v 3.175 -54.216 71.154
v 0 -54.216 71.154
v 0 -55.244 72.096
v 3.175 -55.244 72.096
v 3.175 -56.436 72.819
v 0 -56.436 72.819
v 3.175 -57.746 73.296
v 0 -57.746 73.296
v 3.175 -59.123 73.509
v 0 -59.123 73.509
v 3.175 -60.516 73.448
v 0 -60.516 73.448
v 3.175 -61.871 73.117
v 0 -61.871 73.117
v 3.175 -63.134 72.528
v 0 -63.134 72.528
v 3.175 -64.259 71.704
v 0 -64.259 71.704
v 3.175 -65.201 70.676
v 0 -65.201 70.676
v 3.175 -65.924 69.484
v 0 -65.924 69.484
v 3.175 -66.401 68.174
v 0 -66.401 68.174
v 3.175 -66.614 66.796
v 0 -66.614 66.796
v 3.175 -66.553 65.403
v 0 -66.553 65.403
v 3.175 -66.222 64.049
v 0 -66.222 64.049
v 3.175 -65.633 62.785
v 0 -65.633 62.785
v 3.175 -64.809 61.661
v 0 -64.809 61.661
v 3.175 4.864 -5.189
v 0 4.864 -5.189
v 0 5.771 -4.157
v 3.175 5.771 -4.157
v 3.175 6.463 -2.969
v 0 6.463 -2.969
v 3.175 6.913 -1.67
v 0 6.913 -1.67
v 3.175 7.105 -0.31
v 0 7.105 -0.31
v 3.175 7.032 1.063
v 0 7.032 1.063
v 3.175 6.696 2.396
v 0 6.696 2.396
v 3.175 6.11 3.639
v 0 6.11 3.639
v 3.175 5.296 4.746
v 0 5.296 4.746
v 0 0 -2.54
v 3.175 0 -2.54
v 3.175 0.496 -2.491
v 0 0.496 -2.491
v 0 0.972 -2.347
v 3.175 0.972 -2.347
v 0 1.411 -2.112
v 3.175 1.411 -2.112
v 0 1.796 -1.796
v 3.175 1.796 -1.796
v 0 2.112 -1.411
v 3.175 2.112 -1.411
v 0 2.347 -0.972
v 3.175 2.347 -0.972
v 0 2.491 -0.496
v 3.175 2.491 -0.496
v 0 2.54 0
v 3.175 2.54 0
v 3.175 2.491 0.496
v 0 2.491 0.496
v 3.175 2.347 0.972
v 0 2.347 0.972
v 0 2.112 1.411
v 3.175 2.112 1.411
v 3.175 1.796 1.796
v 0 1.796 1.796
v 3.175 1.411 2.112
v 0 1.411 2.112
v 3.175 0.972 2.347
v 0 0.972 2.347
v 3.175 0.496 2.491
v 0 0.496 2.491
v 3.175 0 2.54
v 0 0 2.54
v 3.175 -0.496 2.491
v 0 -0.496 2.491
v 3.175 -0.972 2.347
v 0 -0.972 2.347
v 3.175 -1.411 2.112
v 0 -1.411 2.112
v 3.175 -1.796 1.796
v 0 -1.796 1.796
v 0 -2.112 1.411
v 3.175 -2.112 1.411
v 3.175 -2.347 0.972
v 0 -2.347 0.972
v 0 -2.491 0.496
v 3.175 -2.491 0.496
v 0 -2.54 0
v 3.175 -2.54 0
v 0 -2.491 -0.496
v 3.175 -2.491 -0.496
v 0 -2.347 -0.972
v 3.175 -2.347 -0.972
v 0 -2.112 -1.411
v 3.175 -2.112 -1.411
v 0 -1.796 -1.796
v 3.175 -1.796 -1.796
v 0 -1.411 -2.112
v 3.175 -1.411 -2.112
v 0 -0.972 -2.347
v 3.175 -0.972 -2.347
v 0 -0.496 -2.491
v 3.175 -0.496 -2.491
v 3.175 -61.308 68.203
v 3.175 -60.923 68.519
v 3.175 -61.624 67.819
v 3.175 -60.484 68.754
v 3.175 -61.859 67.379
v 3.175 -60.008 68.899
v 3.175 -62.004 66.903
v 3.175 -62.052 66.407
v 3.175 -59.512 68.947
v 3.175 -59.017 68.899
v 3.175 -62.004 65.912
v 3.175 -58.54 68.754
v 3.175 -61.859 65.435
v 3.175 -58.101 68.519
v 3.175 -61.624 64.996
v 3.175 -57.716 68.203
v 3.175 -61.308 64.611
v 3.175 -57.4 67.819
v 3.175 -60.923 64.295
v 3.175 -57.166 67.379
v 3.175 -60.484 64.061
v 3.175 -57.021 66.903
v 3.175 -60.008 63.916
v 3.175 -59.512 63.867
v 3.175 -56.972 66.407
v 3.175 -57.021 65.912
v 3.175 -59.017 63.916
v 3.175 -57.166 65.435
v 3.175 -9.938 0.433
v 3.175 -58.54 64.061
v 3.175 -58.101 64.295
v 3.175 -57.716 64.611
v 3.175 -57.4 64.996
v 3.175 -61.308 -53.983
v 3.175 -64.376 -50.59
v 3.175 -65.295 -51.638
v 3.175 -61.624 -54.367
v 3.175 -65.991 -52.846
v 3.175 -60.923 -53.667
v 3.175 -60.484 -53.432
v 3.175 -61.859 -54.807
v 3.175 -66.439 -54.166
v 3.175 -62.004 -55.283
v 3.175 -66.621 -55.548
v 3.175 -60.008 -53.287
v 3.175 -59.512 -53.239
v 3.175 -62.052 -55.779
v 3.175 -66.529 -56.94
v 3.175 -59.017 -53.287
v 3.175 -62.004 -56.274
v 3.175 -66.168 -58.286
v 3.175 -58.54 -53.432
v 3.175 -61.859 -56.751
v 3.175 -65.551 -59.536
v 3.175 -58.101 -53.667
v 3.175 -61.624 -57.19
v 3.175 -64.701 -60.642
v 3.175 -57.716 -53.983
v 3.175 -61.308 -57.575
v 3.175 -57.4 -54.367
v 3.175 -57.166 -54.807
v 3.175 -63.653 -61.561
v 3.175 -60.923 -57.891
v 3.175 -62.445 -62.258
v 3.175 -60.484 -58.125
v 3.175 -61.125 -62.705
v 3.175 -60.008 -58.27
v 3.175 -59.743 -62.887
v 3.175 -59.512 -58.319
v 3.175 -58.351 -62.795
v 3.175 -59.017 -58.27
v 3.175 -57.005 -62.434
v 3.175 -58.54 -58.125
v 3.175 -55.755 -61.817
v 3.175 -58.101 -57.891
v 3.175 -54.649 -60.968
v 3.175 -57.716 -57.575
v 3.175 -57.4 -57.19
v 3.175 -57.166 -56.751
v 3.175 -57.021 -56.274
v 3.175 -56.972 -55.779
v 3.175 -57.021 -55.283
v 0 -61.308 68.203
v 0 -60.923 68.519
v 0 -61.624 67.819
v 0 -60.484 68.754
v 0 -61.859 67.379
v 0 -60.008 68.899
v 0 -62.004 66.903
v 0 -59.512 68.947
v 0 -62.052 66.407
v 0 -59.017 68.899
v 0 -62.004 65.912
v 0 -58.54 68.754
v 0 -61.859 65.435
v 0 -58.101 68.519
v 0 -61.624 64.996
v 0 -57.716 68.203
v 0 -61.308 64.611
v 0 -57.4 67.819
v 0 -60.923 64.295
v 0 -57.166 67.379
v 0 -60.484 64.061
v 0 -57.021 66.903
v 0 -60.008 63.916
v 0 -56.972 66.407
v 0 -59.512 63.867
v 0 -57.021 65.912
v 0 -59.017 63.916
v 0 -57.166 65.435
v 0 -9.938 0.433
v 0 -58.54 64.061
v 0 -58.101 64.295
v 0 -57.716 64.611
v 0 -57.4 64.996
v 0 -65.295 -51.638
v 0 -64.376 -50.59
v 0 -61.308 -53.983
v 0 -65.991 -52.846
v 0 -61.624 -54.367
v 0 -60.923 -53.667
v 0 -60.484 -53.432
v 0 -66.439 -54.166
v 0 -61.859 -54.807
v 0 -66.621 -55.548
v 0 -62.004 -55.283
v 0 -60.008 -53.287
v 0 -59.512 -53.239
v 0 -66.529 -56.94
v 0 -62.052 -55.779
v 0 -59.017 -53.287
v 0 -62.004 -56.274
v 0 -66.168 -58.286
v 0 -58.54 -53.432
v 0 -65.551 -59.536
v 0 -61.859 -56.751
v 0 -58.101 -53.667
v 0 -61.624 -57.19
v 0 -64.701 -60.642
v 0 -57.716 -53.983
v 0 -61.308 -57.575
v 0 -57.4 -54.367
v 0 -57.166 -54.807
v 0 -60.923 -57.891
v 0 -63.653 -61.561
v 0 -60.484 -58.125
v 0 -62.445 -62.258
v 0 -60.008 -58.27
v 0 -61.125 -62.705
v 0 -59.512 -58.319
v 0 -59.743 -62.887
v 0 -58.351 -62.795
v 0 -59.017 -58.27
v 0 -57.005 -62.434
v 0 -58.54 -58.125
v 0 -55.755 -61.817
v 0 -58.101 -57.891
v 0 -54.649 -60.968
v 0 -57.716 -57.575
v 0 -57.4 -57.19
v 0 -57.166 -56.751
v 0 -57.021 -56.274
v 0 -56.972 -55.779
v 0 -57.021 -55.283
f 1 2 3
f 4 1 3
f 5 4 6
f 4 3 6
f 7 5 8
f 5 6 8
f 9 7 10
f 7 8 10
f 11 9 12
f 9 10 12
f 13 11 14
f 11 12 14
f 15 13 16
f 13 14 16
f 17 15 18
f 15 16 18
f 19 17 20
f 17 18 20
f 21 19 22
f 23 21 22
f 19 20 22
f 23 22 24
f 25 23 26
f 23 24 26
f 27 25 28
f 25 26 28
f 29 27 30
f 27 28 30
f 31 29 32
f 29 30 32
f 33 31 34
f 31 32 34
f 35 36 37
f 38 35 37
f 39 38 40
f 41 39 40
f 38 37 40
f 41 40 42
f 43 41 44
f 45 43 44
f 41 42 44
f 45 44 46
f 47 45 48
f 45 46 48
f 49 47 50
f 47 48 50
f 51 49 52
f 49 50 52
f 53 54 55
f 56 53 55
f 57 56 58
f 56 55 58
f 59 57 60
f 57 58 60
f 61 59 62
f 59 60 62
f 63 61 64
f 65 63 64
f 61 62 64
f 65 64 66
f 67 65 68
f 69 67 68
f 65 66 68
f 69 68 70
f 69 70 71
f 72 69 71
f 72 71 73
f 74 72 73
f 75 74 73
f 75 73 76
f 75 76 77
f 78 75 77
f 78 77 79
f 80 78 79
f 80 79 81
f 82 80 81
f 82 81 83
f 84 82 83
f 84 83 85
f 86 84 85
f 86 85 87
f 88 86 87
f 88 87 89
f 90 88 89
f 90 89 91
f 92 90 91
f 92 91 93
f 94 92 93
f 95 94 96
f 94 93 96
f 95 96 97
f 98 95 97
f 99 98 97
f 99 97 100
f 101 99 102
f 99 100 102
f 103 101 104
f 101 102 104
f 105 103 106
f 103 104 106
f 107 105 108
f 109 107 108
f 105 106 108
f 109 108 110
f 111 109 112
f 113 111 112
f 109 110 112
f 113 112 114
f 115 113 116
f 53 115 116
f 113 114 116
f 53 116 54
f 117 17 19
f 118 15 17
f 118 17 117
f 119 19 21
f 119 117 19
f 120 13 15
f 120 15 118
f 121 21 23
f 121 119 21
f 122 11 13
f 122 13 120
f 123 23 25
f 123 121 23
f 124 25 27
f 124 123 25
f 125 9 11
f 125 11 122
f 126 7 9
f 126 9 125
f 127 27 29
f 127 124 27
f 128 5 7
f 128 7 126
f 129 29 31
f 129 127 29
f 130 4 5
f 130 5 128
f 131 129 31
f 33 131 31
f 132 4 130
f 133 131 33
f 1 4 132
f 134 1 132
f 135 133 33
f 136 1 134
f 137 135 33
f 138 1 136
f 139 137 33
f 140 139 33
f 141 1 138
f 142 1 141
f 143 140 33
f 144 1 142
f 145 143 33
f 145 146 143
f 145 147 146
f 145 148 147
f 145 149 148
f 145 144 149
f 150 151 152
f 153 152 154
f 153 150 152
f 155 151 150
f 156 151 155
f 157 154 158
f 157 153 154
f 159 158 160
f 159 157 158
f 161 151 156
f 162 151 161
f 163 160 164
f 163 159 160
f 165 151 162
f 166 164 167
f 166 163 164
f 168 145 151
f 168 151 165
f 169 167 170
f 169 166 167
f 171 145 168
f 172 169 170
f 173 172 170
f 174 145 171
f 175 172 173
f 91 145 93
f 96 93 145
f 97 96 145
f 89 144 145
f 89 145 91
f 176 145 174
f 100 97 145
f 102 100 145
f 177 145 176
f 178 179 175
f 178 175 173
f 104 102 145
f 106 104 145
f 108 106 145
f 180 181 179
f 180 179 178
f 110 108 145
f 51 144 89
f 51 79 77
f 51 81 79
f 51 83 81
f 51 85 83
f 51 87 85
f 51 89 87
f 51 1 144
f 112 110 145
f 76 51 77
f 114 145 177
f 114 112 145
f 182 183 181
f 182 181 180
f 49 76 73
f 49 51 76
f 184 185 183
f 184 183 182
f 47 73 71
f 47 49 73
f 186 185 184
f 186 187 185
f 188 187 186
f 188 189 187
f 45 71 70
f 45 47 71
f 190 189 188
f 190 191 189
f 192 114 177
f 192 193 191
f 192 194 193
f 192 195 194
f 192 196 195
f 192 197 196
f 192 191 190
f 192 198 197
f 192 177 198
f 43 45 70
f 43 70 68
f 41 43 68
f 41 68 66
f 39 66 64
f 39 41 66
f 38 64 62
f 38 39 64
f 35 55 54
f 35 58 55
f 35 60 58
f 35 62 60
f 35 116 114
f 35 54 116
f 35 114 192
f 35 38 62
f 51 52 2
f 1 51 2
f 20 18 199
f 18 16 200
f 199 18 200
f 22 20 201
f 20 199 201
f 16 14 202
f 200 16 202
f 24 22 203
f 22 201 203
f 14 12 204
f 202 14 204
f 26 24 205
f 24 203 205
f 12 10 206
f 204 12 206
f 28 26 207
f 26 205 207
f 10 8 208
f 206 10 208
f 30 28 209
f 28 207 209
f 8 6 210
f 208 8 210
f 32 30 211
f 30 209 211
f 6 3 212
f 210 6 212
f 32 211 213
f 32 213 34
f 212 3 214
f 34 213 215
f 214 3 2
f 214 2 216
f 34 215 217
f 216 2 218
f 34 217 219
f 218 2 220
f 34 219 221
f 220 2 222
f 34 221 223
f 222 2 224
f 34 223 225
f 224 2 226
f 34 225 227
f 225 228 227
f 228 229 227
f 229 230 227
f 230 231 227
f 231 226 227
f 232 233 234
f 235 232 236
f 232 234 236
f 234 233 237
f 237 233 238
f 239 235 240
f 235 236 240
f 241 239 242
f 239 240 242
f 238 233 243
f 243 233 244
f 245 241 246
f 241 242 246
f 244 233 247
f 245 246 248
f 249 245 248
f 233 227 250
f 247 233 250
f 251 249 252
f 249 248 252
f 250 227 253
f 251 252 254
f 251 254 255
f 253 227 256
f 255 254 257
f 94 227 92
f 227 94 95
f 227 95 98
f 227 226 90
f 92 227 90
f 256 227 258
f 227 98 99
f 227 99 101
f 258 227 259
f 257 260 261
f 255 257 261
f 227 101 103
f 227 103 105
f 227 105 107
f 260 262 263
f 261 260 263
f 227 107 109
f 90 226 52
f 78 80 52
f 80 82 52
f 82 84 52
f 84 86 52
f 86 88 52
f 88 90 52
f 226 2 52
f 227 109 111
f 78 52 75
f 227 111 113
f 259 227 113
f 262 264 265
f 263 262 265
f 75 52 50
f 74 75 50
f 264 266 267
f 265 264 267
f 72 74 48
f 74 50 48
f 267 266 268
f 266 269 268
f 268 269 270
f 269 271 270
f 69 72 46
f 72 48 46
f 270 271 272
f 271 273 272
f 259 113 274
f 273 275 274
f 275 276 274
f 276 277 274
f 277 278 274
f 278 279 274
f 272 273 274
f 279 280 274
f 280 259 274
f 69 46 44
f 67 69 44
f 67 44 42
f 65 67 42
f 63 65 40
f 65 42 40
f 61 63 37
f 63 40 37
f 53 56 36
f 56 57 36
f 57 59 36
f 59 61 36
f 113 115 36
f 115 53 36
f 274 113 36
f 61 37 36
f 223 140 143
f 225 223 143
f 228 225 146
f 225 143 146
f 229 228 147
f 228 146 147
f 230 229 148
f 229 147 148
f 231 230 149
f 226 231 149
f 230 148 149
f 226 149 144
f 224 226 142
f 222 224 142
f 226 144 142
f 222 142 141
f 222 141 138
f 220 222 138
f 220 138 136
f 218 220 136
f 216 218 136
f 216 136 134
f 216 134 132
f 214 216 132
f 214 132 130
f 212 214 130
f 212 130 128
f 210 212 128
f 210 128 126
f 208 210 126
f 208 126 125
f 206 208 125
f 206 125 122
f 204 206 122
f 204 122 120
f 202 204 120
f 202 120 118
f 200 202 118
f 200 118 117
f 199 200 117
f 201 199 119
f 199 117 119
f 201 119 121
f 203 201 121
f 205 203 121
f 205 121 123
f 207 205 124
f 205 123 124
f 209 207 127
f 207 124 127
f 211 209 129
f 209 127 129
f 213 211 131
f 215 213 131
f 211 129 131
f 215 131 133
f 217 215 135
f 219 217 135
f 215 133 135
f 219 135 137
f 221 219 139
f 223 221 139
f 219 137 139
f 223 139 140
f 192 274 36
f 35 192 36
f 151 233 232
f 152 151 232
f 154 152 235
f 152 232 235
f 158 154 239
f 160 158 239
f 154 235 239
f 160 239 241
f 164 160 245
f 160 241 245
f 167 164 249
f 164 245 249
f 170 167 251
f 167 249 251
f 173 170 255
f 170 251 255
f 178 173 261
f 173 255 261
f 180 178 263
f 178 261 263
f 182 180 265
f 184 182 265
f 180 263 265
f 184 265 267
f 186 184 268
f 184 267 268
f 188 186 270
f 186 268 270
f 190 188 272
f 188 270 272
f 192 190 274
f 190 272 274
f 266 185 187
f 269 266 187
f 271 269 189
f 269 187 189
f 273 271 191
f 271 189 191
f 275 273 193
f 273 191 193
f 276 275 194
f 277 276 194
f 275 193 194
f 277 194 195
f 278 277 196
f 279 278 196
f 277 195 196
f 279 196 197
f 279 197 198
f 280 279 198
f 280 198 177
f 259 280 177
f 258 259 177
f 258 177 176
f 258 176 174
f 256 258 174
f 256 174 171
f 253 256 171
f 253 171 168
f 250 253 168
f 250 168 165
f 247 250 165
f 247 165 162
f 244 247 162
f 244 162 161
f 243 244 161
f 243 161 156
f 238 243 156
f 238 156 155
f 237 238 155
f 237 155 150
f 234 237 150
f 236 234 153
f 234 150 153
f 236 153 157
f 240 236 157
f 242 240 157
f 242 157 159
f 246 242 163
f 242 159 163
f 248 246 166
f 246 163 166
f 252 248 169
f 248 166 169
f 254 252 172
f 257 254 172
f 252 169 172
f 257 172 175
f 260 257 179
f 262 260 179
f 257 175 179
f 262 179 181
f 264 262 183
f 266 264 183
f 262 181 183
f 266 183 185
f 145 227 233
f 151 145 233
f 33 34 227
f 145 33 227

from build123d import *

# Parameters (mm, degrees)
BOSS_EXTRUDE1_DEPTH = 3.175
SKETCH3_R           = 2.54
CUT_EXTRUDE1_DEPTH  = 100.267219786


with BuildPart() as part:
    # Sketch2 → Boss-Extrude1 (new body)
    with BuildSketch(Plane(origin=(0, 0, 0), x_dir=(0, 0, -1), z_dir=(1, 0, 0))):
        with BuildLine():
            Line((60.967707714, -54.648816697), (5.189086512, 4.863530115))
            ThreePointArc((5.189086512, 4.863530115), (7.105260379, -0.309546352), (4.746461891, -5.296380228))
            Line((4.746461891, -5.296380228), (-0.432958039, -9.938025702))
            Line((-0.432958039, -9.938025702), (50.589534691, -64.375876927))
            ThreePointArc((50.589534691, -64.375876927), (60.642151317, -64.701433324), (60.967707714, -54.648816697))
        make_face()
        with BuildLine():
            ThreePointArc((-5.189086512, -4.863530115), (-7.105260379, 0.309546352), (-4.746461891, 5.296380228))
            Line((-4.746461891, 5.296380228), (-71.153824721, -54.215966584))
            ThreePointArc((-71.153824721, -54.215966584), (-71.703743057, -64.258808703), (-61.660900939, -64.80872704))
            Line((-61.660900939, -64.80872704), (-0.432958039, -9.938025702))
            Line((-0.432958039, -9.938025702), (-5.189086512, -4.863530115))
        make_face()
        with BuildLine():
            ThreePointArc((4.746461891, -5.296380228), (7.105260379, -0.309546352), (5.189086512, 4.863530115))
            ThreePointArc((5.189086512, 4.863530115), (0.309546352, 7.105260379), (-4.746461891, 5.296380228))
            ThreePointArc((-4.746461891, 5.296380228), (-7.105260379, 0.309546352), (-5.189086512, -4.863530115))
            Line((-5.189086512, -4.863530115), (-0.432958039, -9.938025702))
            Line((-0.432958039, -9.938025702), (4.746461891, -5.296380228))
        make_face()
    extrude(amount=BOSS_EXTRUDE1_DEPTH)

    # Sketch3 → Cut-Extrude1 (cut, through all)
    with BuildSketch(Plane(origin=(3.175, 0, 0), x_dir=(0, 0, -1), z_dir=(1, 0, 0))):
        Circle(SKETCH3_R)
        with Locations((-66.40736283, -59.512346812)):
            Circle(SKETCH3_R)
        with Locations((55.778621202, -59.512346812)):
            Circle(SKETCH3_R)
    extrude(amount=-CUT_EXTRUDE1_DEPTH, mode=Mode.SUBTRACT)


solid = part.part
